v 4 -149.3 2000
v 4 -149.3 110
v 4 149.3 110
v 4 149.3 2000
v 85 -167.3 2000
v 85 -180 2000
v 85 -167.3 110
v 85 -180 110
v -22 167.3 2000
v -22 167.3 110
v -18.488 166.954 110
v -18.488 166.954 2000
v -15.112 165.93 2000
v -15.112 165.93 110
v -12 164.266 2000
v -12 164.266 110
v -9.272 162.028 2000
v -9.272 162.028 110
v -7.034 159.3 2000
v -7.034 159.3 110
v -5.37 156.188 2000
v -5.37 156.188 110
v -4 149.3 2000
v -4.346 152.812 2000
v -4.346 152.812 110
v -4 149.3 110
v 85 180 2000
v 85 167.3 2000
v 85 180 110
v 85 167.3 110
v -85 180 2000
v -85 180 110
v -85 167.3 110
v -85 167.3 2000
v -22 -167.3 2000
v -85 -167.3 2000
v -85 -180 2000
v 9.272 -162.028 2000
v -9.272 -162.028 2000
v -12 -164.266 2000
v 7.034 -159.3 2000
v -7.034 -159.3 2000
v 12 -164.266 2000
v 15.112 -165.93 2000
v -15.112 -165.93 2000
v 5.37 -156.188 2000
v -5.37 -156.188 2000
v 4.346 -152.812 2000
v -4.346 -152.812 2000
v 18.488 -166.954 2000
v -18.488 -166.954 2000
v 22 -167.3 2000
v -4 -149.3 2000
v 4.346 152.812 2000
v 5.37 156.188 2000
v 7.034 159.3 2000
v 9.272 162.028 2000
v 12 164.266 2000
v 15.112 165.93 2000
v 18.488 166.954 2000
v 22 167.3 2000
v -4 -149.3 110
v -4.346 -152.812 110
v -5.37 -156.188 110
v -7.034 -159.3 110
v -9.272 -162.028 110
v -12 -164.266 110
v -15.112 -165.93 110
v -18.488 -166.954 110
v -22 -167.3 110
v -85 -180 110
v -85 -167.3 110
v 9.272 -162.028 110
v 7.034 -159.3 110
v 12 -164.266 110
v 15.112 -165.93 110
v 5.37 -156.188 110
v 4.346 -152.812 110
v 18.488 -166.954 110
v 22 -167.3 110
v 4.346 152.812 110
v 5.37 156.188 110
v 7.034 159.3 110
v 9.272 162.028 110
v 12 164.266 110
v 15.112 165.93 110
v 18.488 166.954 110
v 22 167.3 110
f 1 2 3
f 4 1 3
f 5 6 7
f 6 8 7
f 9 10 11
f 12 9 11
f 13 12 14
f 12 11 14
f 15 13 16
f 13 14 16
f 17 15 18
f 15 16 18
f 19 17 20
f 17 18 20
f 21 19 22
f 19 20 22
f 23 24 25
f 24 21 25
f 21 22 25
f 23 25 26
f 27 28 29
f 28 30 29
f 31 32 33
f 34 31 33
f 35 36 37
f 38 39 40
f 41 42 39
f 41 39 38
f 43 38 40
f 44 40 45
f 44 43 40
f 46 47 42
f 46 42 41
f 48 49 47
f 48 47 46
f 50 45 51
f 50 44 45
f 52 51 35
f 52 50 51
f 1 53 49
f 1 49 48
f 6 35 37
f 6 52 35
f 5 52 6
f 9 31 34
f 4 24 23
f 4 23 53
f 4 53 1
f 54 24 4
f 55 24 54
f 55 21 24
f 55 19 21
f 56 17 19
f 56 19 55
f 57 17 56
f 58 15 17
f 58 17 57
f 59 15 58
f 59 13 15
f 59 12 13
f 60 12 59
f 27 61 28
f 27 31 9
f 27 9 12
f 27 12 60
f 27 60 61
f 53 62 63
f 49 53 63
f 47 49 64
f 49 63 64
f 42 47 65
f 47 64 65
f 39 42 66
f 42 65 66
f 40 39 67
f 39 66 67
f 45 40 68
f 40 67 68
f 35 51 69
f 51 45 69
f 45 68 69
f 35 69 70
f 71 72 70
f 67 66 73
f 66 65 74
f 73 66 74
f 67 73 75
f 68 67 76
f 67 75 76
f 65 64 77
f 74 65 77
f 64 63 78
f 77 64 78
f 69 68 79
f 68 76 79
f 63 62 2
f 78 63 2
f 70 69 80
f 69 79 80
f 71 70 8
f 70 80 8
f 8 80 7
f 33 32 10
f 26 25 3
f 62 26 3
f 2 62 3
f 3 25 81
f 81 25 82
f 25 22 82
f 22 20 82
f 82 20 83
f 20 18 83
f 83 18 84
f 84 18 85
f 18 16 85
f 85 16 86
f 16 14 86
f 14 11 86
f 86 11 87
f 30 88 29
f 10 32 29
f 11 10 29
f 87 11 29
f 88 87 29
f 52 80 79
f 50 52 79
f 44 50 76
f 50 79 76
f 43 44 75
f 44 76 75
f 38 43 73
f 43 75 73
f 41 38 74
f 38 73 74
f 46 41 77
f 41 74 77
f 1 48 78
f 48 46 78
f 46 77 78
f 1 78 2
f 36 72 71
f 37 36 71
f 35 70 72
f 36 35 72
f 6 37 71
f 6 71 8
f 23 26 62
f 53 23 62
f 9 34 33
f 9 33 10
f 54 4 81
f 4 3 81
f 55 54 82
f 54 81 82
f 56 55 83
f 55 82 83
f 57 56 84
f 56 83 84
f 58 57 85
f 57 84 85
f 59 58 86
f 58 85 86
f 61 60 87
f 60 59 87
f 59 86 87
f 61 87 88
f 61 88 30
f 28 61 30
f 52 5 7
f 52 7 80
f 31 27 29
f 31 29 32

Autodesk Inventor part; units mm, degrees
ref_plane "Start Plane" through (0, 0, 110) normal (0, 0, 1) x (1, 0, 0)
ref_plane "End Plane" through (0, 0, 2000) normal (0, 0, 1) x (1, 0, 0)
sketch "Sketch" plane through (0, 0, 0) normal (0, 0, 1) x (1, 0, 0)
  line L0 (-85, 167.3) -> (-22, 167.3)
  line L1 (-85, 180) -> (-85, 167.3)
  line L2 (85, 180) -> (-85, 180)
  line L3 (85, 167.3) -> (85, 180)
  line L4 (22, 167.3) -> (85, 167.3)
  line L5 (4, -149.3) -> (4, 149.3)
  line L6 (85, -167.3) -> (22, -167.3)
  line L7 (85, -180) -> (85, -167.3)
  line L8 (-85, -167.3) -> (-85, -180)
  line L9 (-22, -167.3) -> (-85, -167.3)
  line L10 (-4, 149.3) -> (-4, -149.3)
  line L11 (0, -252) -> (0, 252) construction
  line L12 (-4, -167.3) -> (4, -167.3) construction
  arc A0 (-22, -167.3) -> (-4, -149.3) centre (-22, -149.3) ccw
  arc A1 (-4, 149.3) -> (-22, 167.3) centre (-22, 149.3) ccw
  arc A2 (22, 167.3) -> (4, 149.3) centre (22, 149.3) ccw
  arc A3 (4, -149.3) -> (22, -167.3) centre (22, -149.3) ccw
  line L13 (-119, 0) -> (119, 0) construction
  line L14 (-85, -180) -> (85, -180)
  point P0 (-4, 167.3)
  point P1 (4, 167.3)
  point P2 (0, 0)
  point P3 (0, -167.3)
  point P4 (0, 0)
  dimension "d1" = 360
  dimension "d3" = 12.7
  dimension "d5" = 8
  dimension "d7" = 170
  dimension "d13" = 18
  dimension "d14" = 180
  dimension "d15" = 85
extrude "Body" add sketch "Sketch" along normal up to surface (1890 mm away) from surface at 110
sketch "Sketch3" plane through (0, 0, 0) normal (0, 0, 1) x (1, 0, 0)
  line L0 (0, 0) -> (10, 0)
ref_plane "Work Plane3" through (0, 0, 0) normal (0, -1, 0) x (1, 0, 0)
ref_plane "Work Plane4" through (55, -1320, 110) normal (0, 0, -1) x (-1, 0, 0)
split "Split1" plane through (55, -1320, 110) removes the side toward (0, 0, -1)
sketch "Sketch4" plane through (0, 0, 0) normal (0, -1, 0) x (1, 0, 0)
  line L0 (-2, 110) -> (12, 110) projected
  line L1 (-2, 2000) -> (12, 2000) projected
  dimension "d19" = 1890
equation "\"d1\" = ParH"
equation "\"d3\" = t2"
equation "\"d5\" = t1"
equation "\"d7\" = b"
equation "\"d13\" = R1"
equation "\"d14\" = 0.5 * d1"
equation "\"d15\" = 0.5 * d7"
equation "\"d8\" = G_L"
equation "\"b\" = 170"
equation "\"ParH\" = 360"
equation "\"R1\" = 18"
equation "\"G_L\" = d19"
equation "\"t1\" = 8"
equation "\"t2\" = 12.7"
equation "\"G_OFFSET_END\" = 0"
properties part number "DIN 1025 - IPE 360-1890" material "Steel, Mild"
